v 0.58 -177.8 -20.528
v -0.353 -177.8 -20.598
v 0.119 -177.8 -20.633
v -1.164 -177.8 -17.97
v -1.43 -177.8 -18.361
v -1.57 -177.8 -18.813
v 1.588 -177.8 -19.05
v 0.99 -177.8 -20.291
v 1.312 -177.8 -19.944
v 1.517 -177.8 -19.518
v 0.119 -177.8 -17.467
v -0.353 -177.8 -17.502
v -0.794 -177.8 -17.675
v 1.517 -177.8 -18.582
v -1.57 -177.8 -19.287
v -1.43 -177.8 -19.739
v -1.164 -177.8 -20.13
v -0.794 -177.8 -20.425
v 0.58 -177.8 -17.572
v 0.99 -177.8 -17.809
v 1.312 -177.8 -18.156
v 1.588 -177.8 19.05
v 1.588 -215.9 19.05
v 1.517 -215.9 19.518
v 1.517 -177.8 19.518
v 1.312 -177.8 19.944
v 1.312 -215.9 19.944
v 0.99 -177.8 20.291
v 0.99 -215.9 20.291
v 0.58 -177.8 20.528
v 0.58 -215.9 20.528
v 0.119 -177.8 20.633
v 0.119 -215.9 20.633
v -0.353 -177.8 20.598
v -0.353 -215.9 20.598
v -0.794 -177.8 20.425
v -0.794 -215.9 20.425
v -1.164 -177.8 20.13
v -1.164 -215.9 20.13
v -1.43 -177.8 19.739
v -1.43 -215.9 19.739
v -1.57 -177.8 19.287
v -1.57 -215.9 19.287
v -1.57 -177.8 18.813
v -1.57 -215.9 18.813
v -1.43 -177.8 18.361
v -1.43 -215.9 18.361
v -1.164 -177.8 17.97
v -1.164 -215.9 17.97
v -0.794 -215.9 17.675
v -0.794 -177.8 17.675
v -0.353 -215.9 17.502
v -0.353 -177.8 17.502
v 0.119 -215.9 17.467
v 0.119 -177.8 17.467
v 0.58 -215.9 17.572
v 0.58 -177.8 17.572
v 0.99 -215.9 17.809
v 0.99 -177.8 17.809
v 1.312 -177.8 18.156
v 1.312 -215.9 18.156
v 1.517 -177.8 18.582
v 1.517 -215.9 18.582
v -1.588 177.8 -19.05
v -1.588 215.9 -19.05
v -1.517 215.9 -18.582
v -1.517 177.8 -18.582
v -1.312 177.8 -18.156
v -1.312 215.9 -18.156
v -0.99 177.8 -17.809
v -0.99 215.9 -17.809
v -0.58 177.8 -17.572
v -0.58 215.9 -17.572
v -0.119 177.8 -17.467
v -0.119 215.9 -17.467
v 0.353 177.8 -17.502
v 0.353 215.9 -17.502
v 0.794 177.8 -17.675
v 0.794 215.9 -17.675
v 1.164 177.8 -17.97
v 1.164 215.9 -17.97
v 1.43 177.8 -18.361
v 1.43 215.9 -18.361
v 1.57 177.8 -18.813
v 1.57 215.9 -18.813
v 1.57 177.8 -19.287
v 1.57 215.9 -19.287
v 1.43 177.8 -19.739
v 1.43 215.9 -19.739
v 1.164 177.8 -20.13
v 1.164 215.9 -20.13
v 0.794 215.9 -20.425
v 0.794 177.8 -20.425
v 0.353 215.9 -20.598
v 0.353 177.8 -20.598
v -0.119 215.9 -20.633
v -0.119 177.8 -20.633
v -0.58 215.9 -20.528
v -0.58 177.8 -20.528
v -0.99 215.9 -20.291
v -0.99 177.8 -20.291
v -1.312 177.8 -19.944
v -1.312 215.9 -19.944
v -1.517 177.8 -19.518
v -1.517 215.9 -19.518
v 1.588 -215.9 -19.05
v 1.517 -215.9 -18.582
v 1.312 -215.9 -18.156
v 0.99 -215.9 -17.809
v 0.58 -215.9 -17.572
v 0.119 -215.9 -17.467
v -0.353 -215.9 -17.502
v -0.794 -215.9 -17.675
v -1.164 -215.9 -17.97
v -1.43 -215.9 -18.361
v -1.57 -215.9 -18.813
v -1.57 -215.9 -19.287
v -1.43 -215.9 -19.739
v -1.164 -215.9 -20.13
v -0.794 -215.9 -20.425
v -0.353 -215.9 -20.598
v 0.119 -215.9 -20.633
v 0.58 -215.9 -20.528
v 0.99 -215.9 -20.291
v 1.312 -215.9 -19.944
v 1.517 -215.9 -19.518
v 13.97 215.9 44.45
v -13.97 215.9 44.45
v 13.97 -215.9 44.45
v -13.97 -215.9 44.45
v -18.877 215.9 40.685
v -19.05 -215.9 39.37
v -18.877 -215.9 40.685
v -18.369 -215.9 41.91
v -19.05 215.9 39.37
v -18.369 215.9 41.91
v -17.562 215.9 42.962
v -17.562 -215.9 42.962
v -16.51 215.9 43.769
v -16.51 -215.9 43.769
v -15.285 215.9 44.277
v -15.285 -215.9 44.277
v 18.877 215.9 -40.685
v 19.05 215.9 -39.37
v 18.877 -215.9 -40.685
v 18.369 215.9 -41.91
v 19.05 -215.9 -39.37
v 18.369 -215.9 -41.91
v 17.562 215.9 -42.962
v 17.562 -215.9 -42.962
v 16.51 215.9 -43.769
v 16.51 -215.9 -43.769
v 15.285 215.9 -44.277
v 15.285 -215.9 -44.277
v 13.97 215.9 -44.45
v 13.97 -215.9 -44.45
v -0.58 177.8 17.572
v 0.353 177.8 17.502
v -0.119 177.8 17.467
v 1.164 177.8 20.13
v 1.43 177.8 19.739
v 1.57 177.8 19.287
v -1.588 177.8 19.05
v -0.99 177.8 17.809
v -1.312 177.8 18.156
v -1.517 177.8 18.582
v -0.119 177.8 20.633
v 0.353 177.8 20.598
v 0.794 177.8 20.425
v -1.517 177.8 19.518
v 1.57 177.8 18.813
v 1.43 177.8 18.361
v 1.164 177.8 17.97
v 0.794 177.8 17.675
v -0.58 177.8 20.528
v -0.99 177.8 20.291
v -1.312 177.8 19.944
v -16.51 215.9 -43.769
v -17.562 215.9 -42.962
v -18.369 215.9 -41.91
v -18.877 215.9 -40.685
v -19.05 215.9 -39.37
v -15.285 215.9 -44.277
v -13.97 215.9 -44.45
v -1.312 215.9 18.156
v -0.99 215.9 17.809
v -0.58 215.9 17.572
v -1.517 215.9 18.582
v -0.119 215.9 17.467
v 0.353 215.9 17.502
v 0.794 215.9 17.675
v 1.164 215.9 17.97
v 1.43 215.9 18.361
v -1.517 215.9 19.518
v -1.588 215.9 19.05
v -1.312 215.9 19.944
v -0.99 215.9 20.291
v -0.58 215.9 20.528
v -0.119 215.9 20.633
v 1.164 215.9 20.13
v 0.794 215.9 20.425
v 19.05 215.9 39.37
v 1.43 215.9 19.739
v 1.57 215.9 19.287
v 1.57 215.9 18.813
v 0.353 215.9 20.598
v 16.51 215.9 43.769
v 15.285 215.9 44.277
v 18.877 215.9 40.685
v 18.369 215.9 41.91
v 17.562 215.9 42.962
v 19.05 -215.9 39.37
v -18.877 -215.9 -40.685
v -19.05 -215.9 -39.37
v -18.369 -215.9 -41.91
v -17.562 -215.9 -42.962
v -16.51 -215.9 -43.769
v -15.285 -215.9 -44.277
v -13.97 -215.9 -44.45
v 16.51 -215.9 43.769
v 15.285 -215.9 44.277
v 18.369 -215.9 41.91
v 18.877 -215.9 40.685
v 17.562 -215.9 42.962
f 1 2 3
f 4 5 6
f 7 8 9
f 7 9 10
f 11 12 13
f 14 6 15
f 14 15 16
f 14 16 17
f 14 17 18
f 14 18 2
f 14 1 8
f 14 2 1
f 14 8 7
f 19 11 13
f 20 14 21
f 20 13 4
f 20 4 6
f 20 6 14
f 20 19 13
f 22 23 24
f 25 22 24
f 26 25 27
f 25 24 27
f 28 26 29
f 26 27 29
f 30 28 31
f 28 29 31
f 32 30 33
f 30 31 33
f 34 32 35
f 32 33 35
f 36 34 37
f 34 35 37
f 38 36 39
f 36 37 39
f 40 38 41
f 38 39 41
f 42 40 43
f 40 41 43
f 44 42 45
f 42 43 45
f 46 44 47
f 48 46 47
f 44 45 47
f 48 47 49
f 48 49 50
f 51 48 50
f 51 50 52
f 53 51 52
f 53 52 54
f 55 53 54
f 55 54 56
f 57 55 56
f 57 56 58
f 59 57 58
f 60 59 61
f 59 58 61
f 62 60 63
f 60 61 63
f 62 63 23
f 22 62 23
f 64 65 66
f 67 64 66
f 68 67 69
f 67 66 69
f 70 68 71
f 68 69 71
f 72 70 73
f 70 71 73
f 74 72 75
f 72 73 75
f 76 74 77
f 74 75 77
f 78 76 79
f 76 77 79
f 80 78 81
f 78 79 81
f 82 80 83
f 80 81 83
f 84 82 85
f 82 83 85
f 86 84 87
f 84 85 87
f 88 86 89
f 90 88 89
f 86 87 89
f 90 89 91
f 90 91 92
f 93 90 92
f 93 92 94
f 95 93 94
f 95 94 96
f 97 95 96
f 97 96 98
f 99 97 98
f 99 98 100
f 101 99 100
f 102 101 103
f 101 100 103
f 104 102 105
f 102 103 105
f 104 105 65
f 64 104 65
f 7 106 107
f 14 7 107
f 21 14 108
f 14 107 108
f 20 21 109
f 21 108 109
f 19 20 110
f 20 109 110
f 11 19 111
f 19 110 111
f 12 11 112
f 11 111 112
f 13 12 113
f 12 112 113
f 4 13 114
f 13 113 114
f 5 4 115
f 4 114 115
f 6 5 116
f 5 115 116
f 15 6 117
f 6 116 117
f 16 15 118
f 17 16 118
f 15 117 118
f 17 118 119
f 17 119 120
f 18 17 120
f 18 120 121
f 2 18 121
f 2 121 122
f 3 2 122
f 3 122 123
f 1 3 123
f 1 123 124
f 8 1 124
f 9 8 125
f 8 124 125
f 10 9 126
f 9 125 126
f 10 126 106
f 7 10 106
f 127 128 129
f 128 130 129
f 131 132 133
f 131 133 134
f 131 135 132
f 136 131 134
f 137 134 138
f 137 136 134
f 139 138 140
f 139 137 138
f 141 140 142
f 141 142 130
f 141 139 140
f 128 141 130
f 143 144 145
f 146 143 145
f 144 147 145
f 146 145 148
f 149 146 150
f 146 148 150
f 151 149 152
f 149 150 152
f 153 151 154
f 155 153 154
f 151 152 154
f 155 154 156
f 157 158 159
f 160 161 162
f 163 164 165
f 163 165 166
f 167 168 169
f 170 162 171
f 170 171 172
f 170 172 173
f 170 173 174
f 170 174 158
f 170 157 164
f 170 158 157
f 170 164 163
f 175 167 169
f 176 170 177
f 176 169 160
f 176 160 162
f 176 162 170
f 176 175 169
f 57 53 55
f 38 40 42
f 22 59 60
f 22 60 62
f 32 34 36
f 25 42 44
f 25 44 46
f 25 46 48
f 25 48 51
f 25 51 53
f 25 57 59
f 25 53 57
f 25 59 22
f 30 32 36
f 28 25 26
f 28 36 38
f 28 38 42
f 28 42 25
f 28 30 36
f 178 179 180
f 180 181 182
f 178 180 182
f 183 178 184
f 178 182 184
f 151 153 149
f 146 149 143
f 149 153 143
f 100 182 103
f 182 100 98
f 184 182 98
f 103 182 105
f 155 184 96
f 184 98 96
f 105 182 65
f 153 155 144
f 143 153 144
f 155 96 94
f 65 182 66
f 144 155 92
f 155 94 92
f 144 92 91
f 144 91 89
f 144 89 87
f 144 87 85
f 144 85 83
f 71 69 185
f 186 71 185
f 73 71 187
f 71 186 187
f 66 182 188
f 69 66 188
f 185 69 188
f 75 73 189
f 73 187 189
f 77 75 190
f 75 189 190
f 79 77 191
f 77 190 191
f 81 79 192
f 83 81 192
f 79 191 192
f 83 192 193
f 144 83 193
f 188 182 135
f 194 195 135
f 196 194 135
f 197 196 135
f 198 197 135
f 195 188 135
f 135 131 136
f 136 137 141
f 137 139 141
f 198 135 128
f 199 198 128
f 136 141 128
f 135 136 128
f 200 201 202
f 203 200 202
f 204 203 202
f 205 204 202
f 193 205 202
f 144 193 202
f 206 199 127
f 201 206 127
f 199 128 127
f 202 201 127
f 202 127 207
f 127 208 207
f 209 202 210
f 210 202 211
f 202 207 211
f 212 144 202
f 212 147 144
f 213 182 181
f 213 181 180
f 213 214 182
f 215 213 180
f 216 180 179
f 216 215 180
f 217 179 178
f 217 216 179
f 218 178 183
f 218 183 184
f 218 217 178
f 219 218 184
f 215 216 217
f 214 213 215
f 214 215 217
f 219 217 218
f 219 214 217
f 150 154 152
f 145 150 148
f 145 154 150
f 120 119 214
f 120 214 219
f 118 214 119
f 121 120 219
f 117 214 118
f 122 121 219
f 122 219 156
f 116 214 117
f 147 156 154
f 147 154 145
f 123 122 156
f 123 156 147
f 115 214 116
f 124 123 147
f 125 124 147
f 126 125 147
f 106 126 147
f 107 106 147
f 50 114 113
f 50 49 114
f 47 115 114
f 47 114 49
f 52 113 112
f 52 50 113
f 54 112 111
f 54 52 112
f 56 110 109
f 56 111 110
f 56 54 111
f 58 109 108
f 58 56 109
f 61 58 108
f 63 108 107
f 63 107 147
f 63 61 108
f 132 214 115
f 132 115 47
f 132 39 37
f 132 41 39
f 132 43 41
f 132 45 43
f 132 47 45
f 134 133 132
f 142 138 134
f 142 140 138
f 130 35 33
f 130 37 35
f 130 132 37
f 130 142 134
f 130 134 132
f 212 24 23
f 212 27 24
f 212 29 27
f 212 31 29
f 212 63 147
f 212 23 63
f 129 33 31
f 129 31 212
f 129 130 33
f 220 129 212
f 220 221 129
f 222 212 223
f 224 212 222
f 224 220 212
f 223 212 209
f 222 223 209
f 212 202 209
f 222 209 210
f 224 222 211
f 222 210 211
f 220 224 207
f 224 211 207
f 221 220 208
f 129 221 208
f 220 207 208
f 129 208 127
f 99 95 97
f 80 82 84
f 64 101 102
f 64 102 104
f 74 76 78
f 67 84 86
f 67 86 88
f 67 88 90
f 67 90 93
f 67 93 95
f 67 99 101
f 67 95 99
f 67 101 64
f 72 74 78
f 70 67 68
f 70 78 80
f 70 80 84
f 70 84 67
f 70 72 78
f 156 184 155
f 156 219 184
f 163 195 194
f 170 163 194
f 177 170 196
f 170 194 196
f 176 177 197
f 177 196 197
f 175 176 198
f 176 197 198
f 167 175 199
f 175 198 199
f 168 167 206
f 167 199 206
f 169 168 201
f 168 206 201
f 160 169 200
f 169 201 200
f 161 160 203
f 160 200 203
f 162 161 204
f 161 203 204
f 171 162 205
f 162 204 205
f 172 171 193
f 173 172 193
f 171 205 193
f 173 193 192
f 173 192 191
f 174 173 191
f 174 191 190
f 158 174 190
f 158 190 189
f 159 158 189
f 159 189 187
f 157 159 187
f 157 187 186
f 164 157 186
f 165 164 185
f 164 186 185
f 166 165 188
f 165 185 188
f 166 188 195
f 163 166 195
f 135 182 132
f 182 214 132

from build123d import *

# Parameters (mm, degrees)
F0_W      = 38.1
F0_H      = 88.9
F1_DEPTH  = 215.9
F2_R      = 5.08
F4_R      = 1.5875
F5_DEPTH  = 38.1
F6_R      = 1.5875
F7_DEPTH  = 38.1
F8_R      = 1.5875
F9_DEPTH  = 38.1
F10_R     = 1.5875
F11_DEPTH = 38.1


with BuildPart() as f1:
    # F0 (on Front) → F1 (new body, symmetric)
    with BuildSketch(Plane.XZ):
        Rectangle(F0_W, F0_H)
    extrude(amount=F1_DEPTH, both=True)

    # F2
    f2_edges = [f1.edges().sort_by_distance(p)[0] for p in [
        (19.05, 0, 44.45),
        (-19.05, 0, 44.45),
        (19.05, 0, -44.45),
        (-19.05, 0, -44.45),
    ]]
    fillet(f2_edges, radius=F2_R)

    # F4 (on face) → F5 (cut)
    with BuildSketch(Plane.XZ.offset(215.9)):
        with Locations((0, 19.05)):
            Circle(F4_R)
    extrude(amount=-F5_DEPTH, mode=Mode.SUBTRACT)

    # F6 (on face) → F7 (cut)
    with BuildSketch(Plane.XZ.offset(215.9)):
        with Locations((0, -19.05)):
            Circle(F6_R)
    extrude(amount=-F7_DEPTH, mode=Mode.SUBTRACT)

    # F8 (on face) → F9 (cut)
    with BuildSketch(Plane(origin=(0, 215.9, 0), x_dir=(-1, 0, 0), z_dir=(0, 1, 0))):
        with Locations((0, 19.05)):
            Circle(F8_R)
    extrude(amount=-F9_DEPTH, mode=Mode.SUBTRACT)

    # F10 (on face) → F11 (cut)
    with BuildSketch(Plane(origin=(0, 215.9, 0), x_dir=(-1, 0, 0), z_dir=(0, 1, 0))):
        with Locations((0, -19.05)):
            Circle(F10_R)
    extrude(amount=-F11_DEPTH, mode=Mode.SUBTRACT)


solid = f1.part
